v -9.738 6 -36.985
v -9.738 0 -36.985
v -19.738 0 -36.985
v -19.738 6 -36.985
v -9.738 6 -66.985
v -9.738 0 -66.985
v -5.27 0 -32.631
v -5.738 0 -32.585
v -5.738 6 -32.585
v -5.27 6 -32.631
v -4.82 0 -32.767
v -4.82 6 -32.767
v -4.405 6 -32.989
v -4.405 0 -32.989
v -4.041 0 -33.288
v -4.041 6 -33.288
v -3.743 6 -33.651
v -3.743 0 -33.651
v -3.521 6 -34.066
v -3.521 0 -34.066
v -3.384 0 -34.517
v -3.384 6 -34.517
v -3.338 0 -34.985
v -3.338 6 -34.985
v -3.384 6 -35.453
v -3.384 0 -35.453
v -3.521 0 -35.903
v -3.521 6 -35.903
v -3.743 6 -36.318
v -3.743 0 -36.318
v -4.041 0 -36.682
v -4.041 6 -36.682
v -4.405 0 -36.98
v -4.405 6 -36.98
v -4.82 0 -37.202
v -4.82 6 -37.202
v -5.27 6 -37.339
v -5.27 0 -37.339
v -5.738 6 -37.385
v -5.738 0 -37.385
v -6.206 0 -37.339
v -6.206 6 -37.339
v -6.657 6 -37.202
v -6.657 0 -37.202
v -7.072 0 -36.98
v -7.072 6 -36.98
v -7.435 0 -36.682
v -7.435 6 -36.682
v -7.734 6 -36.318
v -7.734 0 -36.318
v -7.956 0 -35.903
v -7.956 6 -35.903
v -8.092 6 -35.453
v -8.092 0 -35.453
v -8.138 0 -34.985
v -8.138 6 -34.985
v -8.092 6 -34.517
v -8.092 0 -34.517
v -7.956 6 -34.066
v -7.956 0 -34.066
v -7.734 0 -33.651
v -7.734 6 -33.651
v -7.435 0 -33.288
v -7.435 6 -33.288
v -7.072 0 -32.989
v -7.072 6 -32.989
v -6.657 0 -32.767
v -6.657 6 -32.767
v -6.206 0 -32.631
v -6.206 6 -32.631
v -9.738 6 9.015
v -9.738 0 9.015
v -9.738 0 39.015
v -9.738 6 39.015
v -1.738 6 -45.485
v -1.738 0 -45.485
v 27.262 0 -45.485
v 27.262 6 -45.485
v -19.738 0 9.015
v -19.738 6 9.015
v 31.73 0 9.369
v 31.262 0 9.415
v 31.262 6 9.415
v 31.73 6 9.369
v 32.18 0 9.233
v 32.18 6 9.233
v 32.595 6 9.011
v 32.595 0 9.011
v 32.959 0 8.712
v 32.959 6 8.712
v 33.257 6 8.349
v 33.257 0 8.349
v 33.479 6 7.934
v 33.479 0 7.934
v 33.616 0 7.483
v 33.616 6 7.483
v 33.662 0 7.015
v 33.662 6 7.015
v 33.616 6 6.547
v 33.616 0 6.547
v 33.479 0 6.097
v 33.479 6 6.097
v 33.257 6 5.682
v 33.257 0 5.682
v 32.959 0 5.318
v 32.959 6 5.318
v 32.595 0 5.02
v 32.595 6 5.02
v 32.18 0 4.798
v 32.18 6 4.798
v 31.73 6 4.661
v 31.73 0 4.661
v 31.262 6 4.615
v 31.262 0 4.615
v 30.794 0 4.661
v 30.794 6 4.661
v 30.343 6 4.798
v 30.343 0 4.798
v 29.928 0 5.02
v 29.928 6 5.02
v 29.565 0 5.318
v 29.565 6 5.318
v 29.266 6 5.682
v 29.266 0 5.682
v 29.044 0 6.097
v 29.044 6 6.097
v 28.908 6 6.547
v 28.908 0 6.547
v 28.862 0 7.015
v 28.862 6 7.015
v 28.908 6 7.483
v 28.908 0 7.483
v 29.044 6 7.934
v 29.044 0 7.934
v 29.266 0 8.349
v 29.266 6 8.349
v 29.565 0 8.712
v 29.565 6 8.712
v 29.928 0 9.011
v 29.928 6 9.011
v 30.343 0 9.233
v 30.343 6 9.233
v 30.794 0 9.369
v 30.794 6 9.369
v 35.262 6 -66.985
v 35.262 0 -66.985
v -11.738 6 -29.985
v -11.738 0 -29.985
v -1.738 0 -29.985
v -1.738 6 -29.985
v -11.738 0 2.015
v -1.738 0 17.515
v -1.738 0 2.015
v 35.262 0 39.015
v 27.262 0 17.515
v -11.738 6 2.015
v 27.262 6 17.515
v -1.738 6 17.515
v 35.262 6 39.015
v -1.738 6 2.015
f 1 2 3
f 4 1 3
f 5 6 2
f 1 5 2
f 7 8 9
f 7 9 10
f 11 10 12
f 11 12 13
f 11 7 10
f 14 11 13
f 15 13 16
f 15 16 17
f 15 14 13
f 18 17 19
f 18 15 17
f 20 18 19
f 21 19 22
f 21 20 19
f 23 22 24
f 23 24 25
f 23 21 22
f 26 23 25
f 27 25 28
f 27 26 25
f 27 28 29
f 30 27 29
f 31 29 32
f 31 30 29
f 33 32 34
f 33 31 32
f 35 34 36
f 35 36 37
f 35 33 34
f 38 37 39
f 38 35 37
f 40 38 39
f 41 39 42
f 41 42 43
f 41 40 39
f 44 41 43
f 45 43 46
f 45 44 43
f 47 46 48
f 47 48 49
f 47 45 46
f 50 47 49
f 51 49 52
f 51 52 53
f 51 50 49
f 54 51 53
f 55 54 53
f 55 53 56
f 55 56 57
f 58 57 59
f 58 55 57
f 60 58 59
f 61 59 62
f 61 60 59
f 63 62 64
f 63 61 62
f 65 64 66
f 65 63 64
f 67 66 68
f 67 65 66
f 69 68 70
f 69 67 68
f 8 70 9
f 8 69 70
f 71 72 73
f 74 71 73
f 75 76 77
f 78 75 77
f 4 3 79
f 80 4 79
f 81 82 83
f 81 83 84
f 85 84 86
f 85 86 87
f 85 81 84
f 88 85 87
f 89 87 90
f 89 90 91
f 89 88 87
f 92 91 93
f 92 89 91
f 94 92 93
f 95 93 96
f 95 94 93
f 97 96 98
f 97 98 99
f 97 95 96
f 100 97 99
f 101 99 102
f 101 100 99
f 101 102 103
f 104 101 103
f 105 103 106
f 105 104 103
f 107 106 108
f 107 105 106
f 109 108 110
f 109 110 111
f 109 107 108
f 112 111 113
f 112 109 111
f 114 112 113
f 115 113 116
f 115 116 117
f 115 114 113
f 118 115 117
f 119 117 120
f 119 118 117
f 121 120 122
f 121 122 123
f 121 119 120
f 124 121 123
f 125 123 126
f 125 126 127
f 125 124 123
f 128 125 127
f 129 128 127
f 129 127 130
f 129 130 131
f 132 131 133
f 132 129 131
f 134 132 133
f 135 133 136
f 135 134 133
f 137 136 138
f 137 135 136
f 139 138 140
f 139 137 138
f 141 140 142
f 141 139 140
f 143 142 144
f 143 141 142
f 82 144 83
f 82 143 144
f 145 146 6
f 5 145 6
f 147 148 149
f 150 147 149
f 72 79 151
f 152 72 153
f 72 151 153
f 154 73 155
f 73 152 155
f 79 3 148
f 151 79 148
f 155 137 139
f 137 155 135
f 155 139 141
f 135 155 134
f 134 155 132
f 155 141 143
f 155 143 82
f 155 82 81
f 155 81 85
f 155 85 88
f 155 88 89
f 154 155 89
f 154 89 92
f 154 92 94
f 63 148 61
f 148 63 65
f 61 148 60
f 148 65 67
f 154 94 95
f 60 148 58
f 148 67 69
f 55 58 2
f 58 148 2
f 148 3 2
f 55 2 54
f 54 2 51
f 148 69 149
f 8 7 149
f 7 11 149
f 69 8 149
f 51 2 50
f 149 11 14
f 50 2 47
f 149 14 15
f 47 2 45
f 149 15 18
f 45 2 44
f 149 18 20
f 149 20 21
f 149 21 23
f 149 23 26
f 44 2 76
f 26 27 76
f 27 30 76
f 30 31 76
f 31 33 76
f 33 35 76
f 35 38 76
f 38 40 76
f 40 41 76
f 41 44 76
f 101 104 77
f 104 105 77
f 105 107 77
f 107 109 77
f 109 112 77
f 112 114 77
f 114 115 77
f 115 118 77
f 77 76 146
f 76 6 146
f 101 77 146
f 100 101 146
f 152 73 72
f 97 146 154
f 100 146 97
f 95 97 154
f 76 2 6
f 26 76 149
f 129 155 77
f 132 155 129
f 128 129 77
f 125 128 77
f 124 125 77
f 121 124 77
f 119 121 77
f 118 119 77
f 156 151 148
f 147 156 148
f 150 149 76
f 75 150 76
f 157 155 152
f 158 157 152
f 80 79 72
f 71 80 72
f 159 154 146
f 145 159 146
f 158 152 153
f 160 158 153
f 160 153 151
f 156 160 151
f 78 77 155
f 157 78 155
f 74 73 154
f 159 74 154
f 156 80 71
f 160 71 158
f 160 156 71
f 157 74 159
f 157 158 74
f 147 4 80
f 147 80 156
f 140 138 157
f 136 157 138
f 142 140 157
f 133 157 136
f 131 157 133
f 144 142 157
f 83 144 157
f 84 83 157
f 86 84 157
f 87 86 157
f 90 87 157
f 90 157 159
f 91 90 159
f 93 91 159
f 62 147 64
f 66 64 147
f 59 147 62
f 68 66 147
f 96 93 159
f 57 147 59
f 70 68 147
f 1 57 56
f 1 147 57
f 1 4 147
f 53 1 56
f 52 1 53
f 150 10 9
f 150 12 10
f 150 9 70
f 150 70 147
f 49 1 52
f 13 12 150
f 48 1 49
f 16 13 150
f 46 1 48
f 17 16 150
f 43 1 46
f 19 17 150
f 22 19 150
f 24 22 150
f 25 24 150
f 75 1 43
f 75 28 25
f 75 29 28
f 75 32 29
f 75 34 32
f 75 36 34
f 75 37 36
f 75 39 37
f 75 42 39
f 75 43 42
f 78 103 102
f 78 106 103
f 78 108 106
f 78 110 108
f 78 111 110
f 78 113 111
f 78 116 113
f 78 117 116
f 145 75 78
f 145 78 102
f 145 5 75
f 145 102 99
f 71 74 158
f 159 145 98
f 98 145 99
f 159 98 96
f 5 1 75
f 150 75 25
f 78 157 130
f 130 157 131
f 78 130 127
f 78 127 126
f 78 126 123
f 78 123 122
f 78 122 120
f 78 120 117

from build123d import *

# Parameters (mm, degrees)
SKETCH_1_R      = 2.4
EXTRUDE_1_DEPTH = 6


with BuildPart() as part:
    # 草图1 → 凸台-拉伸1 (new body)
    # profile 1 of 2: a face of its own
    with BuildSketch(Plane(origin=(0, 0, 0), x_dir=(1, 0, 0), z_dir=(0, 1, 0))):
        Polygon((35.26180856, 66.984800923), (-9.73819144, 66.984800923), (-9.73819144, 36.984800923), (-9.73819144, 29.984800923), (-1.73819144, 29.984800923), (-1.73819144, 45.484800923), (27.26180856, 45.484800923), (27.26180856, -17.515199077), (-1.73819144, -17.515199077), (-1.73819144, -2.015199077), (-9.73819144, -2.015199077), (-9.73819144, -9.015199077), (-9.73819144, -39.015199077), (35.26180856, -39.015199077), align=None)
        with Locations(Location((31.26180856, -7.015199077, 0), (0, 0, 270))):
            Circle(SKETCH_1_R, mode=Mode.SUBTRACT)
        with Locations(Location((-5.73819144, 34.984800923, 0), (0, 0, 270))):
            Circle(SKETCH_1_R, mode=Mode.SUBTRACT)
    # profile 2 of 2: a face of its own
    with BuildSketch(Plane(origin=(0, 0, 0), x_dir=(1, 0, 0), z_dir=(0, 1, 0))):
        Polygon((-9.73819144, 29.984800923), (-9.73819144, 36.984800923), (-19.73819144, 36.984800923), (-19.73819144, -9.015199077), (-9.73819144, -9.015199077), (-9.73819144, -2.015199077), (-11.73819144, -2.015199077), (-11.73819144, 29.984800923), align=None)
    extrude(amount=EXTRUDE_1_DEPTH)


solid = part.part
